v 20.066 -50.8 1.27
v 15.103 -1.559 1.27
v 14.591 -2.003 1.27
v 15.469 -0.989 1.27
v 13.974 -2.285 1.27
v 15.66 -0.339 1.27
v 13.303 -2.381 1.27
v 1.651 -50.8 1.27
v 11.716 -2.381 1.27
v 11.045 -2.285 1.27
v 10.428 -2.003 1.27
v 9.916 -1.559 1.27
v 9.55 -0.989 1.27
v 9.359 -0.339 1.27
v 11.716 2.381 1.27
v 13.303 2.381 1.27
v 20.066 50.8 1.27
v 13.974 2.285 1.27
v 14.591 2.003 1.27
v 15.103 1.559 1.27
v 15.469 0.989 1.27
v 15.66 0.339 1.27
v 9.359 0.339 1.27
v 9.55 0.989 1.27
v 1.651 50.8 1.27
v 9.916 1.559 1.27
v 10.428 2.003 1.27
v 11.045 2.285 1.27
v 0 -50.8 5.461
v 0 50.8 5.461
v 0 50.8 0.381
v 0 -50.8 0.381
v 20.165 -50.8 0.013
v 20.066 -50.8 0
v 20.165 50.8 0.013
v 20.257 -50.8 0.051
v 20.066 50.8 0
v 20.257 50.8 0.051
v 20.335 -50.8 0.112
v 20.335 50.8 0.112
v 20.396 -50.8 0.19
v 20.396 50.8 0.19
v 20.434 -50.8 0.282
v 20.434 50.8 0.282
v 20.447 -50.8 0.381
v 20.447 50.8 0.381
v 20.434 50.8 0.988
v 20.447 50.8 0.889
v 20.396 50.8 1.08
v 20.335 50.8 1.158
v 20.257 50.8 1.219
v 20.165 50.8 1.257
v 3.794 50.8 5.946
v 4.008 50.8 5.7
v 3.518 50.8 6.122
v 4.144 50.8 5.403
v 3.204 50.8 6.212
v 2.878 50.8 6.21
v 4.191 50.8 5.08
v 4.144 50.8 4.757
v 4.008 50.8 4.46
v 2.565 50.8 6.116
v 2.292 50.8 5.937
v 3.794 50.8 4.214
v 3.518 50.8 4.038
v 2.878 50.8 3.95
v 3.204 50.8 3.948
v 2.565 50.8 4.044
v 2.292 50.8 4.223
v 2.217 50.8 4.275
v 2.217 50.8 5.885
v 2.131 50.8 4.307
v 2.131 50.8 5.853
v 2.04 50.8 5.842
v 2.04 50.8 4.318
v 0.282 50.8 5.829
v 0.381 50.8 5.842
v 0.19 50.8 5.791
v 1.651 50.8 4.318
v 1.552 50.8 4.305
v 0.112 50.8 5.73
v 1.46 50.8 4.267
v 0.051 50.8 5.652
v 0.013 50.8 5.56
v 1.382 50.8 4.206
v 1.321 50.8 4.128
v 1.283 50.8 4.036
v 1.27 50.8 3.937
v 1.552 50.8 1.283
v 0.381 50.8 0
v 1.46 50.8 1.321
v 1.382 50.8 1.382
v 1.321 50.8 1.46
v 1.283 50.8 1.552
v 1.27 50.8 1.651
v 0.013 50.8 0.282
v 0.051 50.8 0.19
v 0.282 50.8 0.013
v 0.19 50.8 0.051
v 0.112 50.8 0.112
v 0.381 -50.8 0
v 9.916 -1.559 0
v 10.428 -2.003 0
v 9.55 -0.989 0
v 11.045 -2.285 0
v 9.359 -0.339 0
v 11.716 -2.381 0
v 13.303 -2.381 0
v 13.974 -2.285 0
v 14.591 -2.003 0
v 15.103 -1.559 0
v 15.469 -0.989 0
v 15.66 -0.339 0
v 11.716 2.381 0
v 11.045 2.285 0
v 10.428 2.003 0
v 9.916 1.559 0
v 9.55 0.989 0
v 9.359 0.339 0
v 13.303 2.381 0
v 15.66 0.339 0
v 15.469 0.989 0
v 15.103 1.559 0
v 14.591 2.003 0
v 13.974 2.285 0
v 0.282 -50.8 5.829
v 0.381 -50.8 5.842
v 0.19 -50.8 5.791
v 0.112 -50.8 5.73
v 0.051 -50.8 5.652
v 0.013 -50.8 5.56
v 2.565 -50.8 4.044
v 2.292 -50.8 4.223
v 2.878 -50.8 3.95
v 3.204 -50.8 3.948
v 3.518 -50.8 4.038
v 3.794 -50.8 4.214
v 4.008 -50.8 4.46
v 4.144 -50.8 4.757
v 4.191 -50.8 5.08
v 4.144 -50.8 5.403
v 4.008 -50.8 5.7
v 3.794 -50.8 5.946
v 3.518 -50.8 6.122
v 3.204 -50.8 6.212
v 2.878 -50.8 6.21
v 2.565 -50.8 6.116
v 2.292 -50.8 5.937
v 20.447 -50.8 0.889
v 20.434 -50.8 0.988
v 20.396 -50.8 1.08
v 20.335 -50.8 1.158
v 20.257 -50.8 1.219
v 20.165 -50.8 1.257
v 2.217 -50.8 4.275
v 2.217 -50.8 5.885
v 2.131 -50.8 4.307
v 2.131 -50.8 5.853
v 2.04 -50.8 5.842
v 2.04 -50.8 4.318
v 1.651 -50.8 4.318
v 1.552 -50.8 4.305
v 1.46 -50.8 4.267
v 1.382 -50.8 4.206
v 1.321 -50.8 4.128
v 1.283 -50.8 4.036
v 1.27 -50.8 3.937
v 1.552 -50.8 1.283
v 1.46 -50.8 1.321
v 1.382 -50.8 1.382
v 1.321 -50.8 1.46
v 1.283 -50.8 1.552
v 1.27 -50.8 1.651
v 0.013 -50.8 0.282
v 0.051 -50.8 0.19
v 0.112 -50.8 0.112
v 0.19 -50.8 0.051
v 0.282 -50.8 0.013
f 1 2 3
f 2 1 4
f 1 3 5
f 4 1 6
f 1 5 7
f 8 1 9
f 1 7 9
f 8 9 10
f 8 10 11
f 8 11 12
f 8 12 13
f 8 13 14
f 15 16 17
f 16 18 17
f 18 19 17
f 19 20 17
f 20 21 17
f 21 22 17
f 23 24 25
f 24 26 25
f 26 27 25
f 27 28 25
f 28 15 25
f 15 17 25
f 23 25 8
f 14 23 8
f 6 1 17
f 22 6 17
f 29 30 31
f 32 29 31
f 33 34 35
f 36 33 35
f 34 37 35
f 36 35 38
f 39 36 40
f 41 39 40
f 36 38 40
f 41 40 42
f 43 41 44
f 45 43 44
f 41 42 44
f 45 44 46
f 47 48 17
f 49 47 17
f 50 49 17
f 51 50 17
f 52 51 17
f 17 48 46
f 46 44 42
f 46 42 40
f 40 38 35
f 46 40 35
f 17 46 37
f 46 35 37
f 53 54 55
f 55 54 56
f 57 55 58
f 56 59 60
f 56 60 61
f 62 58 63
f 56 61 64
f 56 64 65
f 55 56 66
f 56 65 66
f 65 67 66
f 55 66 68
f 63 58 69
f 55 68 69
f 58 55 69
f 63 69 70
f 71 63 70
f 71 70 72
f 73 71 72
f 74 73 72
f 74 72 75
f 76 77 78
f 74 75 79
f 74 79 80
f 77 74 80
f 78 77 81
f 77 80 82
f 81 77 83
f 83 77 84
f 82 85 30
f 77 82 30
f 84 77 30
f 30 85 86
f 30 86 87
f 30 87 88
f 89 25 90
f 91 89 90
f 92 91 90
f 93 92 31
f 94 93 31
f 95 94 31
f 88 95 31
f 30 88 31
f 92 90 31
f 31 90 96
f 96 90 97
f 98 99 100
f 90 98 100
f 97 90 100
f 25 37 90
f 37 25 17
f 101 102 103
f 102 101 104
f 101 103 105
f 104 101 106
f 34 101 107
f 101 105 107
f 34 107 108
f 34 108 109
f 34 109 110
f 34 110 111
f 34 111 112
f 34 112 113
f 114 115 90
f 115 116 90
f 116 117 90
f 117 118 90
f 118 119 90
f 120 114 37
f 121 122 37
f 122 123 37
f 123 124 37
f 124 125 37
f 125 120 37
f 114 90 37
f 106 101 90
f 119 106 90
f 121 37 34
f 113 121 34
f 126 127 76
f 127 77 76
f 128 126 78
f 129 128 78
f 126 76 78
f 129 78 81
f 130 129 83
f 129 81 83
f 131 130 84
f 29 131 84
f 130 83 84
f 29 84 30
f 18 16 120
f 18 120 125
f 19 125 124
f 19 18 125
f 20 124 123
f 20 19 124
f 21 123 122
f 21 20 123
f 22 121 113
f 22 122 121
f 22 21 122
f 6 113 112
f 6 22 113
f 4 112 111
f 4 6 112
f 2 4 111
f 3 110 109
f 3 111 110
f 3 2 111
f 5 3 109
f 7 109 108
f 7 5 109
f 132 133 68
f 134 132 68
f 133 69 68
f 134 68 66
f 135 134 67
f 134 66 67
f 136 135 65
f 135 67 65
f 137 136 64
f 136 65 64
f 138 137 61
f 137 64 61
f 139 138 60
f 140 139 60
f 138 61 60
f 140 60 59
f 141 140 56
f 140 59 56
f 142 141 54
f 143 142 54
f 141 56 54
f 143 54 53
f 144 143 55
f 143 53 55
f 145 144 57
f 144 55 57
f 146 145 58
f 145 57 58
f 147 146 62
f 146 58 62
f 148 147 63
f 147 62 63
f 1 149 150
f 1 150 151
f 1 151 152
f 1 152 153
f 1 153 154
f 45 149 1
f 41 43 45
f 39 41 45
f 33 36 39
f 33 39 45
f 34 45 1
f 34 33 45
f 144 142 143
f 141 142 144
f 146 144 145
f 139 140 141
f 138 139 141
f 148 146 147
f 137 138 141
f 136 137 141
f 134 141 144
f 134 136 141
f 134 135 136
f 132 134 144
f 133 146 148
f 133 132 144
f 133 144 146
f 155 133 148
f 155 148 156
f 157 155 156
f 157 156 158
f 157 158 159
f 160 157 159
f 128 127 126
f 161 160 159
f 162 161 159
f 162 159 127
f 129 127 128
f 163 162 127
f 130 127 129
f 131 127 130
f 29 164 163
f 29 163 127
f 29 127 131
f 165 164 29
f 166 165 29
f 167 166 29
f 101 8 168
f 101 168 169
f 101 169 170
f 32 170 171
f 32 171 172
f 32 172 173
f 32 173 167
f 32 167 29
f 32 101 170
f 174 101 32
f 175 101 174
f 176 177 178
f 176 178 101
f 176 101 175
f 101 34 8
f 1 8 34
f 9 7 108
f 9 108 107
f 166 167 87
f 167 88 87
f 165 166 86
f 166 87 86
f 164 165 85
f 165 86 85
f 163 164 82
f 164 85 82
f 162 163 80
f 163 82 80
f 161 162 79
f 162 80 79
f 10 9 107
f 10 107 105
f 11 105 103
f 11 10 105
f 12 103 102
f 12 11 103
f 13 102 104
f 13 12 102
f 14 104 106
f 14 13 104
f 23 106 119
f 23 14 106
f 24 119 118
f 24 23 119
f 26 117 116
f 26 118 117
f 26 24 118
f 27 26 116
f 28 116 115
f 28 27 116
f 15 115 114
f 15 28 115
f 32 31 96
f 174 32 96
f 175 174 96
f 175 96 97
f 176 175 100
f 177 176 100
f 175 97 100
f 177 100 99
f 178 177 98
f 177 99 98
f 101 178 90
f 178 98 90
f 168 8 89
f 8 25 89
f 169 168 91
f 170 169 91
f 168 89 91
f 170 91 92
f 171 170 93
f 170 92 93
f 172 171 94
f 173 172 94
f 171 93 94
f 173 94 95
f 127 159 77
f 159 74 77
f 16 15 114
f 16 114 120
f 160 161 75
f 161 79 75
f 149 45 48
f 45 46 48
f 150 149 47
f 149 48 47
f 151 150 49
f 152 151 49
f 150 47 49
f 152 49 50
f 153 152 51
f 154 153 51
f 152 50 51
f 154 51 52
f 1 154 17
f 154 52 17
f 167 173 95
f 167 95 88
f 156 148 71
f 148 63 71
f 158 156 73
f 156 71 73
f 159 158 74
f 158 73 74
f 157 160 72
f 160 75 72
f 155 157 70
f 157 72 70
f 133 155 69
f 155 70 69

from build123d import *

# Parameters (mm, degrees)
BOSS_EXTRUDE1_DEPTH = 50.8
CUT_EXTRUDE1_DEPTH  = 2.27


with BuildPart() as part:
    # Sketch2 → Boss-Extrude1 (new body, symmetric)
    with BuildSketch(Plane(origin=(0, 0, 0), x_dir=(1, 0, 0), z_dir=(0, 1, 0))):
        with BuildLine():
            Line((0.381, 0), (20.066, 0))
            ThreePointArc((20.066, 0), (20.335407684, -0.111592316), (20.447, -0.381))
            Line((20.447, -0.381), (20.447, -0.889))
            ThreePointArc((20.447, -0.889), (20.335407684, -1.158407684), (20.066, -1.27))
            Line((20.066, -1.27), (1.651, -1.27))
            ThreePointArc((1.651, -1.27), (1.381592316, -1.381592316), (1.27, -1.651))
            Line((1.27, -1.651), (1.27, -3.937))
            ThreePointArc((1.27, -3.937), (1.381592316, -4.206407684), (1.651, -4.318))
            Line((1.651, -4.318), (2.03996875, -4.318))
            ThreePointArc((2.03996875, -4.318), (2.174672592, -4.293392866), (2.291976563, -4.22275))
            ThreePointArc((2.291976563, -4.22275), (4.191, -5.08), (2.291976563, -5.93725))
            ThreePointArc((2.291976563, -5.93725), (2.174672592, -5.866607134), (2.03996875, -5.842))
            Line((2.03996875, -5.842), (0.381, -5.842))
            ThreePointArc((0.381, -5.842), (0.111592316, -5.730407684), (0, -5.461))
            Line((0, -5.461), (0, -0.381))
            ThreePointArc((0, -0.381), (0.111592316, -0.111592316), (0.381, 0))
        make_face()
    extrude(amount=BOSS_EXTRUDE1_DEPTH, both=True)

    # Sketch7 → Cut-Extrude1 (cut, through all)
    with BuildSketch(Plane.XY.offset(1.27)):
        with BuildLine():
            Line((11.71575, 2.38125), (13.30325, 2.38125))
            ThreePointArc((13.30325, 2.38125), (15.6845, 0), (13.30325, -2.38125))
            Line((13.30325, -2.38125), (11.71575, -2.38125))
            ThreePointArc((11.71575, -2.38125), (9.3345, 0), (11.71575, 2.38125))
        make_face()
    extrude(amount=-CUT_EXTRUDE1_DEPTH, mode=Mode.SUBTRACT)


solid = part.part
